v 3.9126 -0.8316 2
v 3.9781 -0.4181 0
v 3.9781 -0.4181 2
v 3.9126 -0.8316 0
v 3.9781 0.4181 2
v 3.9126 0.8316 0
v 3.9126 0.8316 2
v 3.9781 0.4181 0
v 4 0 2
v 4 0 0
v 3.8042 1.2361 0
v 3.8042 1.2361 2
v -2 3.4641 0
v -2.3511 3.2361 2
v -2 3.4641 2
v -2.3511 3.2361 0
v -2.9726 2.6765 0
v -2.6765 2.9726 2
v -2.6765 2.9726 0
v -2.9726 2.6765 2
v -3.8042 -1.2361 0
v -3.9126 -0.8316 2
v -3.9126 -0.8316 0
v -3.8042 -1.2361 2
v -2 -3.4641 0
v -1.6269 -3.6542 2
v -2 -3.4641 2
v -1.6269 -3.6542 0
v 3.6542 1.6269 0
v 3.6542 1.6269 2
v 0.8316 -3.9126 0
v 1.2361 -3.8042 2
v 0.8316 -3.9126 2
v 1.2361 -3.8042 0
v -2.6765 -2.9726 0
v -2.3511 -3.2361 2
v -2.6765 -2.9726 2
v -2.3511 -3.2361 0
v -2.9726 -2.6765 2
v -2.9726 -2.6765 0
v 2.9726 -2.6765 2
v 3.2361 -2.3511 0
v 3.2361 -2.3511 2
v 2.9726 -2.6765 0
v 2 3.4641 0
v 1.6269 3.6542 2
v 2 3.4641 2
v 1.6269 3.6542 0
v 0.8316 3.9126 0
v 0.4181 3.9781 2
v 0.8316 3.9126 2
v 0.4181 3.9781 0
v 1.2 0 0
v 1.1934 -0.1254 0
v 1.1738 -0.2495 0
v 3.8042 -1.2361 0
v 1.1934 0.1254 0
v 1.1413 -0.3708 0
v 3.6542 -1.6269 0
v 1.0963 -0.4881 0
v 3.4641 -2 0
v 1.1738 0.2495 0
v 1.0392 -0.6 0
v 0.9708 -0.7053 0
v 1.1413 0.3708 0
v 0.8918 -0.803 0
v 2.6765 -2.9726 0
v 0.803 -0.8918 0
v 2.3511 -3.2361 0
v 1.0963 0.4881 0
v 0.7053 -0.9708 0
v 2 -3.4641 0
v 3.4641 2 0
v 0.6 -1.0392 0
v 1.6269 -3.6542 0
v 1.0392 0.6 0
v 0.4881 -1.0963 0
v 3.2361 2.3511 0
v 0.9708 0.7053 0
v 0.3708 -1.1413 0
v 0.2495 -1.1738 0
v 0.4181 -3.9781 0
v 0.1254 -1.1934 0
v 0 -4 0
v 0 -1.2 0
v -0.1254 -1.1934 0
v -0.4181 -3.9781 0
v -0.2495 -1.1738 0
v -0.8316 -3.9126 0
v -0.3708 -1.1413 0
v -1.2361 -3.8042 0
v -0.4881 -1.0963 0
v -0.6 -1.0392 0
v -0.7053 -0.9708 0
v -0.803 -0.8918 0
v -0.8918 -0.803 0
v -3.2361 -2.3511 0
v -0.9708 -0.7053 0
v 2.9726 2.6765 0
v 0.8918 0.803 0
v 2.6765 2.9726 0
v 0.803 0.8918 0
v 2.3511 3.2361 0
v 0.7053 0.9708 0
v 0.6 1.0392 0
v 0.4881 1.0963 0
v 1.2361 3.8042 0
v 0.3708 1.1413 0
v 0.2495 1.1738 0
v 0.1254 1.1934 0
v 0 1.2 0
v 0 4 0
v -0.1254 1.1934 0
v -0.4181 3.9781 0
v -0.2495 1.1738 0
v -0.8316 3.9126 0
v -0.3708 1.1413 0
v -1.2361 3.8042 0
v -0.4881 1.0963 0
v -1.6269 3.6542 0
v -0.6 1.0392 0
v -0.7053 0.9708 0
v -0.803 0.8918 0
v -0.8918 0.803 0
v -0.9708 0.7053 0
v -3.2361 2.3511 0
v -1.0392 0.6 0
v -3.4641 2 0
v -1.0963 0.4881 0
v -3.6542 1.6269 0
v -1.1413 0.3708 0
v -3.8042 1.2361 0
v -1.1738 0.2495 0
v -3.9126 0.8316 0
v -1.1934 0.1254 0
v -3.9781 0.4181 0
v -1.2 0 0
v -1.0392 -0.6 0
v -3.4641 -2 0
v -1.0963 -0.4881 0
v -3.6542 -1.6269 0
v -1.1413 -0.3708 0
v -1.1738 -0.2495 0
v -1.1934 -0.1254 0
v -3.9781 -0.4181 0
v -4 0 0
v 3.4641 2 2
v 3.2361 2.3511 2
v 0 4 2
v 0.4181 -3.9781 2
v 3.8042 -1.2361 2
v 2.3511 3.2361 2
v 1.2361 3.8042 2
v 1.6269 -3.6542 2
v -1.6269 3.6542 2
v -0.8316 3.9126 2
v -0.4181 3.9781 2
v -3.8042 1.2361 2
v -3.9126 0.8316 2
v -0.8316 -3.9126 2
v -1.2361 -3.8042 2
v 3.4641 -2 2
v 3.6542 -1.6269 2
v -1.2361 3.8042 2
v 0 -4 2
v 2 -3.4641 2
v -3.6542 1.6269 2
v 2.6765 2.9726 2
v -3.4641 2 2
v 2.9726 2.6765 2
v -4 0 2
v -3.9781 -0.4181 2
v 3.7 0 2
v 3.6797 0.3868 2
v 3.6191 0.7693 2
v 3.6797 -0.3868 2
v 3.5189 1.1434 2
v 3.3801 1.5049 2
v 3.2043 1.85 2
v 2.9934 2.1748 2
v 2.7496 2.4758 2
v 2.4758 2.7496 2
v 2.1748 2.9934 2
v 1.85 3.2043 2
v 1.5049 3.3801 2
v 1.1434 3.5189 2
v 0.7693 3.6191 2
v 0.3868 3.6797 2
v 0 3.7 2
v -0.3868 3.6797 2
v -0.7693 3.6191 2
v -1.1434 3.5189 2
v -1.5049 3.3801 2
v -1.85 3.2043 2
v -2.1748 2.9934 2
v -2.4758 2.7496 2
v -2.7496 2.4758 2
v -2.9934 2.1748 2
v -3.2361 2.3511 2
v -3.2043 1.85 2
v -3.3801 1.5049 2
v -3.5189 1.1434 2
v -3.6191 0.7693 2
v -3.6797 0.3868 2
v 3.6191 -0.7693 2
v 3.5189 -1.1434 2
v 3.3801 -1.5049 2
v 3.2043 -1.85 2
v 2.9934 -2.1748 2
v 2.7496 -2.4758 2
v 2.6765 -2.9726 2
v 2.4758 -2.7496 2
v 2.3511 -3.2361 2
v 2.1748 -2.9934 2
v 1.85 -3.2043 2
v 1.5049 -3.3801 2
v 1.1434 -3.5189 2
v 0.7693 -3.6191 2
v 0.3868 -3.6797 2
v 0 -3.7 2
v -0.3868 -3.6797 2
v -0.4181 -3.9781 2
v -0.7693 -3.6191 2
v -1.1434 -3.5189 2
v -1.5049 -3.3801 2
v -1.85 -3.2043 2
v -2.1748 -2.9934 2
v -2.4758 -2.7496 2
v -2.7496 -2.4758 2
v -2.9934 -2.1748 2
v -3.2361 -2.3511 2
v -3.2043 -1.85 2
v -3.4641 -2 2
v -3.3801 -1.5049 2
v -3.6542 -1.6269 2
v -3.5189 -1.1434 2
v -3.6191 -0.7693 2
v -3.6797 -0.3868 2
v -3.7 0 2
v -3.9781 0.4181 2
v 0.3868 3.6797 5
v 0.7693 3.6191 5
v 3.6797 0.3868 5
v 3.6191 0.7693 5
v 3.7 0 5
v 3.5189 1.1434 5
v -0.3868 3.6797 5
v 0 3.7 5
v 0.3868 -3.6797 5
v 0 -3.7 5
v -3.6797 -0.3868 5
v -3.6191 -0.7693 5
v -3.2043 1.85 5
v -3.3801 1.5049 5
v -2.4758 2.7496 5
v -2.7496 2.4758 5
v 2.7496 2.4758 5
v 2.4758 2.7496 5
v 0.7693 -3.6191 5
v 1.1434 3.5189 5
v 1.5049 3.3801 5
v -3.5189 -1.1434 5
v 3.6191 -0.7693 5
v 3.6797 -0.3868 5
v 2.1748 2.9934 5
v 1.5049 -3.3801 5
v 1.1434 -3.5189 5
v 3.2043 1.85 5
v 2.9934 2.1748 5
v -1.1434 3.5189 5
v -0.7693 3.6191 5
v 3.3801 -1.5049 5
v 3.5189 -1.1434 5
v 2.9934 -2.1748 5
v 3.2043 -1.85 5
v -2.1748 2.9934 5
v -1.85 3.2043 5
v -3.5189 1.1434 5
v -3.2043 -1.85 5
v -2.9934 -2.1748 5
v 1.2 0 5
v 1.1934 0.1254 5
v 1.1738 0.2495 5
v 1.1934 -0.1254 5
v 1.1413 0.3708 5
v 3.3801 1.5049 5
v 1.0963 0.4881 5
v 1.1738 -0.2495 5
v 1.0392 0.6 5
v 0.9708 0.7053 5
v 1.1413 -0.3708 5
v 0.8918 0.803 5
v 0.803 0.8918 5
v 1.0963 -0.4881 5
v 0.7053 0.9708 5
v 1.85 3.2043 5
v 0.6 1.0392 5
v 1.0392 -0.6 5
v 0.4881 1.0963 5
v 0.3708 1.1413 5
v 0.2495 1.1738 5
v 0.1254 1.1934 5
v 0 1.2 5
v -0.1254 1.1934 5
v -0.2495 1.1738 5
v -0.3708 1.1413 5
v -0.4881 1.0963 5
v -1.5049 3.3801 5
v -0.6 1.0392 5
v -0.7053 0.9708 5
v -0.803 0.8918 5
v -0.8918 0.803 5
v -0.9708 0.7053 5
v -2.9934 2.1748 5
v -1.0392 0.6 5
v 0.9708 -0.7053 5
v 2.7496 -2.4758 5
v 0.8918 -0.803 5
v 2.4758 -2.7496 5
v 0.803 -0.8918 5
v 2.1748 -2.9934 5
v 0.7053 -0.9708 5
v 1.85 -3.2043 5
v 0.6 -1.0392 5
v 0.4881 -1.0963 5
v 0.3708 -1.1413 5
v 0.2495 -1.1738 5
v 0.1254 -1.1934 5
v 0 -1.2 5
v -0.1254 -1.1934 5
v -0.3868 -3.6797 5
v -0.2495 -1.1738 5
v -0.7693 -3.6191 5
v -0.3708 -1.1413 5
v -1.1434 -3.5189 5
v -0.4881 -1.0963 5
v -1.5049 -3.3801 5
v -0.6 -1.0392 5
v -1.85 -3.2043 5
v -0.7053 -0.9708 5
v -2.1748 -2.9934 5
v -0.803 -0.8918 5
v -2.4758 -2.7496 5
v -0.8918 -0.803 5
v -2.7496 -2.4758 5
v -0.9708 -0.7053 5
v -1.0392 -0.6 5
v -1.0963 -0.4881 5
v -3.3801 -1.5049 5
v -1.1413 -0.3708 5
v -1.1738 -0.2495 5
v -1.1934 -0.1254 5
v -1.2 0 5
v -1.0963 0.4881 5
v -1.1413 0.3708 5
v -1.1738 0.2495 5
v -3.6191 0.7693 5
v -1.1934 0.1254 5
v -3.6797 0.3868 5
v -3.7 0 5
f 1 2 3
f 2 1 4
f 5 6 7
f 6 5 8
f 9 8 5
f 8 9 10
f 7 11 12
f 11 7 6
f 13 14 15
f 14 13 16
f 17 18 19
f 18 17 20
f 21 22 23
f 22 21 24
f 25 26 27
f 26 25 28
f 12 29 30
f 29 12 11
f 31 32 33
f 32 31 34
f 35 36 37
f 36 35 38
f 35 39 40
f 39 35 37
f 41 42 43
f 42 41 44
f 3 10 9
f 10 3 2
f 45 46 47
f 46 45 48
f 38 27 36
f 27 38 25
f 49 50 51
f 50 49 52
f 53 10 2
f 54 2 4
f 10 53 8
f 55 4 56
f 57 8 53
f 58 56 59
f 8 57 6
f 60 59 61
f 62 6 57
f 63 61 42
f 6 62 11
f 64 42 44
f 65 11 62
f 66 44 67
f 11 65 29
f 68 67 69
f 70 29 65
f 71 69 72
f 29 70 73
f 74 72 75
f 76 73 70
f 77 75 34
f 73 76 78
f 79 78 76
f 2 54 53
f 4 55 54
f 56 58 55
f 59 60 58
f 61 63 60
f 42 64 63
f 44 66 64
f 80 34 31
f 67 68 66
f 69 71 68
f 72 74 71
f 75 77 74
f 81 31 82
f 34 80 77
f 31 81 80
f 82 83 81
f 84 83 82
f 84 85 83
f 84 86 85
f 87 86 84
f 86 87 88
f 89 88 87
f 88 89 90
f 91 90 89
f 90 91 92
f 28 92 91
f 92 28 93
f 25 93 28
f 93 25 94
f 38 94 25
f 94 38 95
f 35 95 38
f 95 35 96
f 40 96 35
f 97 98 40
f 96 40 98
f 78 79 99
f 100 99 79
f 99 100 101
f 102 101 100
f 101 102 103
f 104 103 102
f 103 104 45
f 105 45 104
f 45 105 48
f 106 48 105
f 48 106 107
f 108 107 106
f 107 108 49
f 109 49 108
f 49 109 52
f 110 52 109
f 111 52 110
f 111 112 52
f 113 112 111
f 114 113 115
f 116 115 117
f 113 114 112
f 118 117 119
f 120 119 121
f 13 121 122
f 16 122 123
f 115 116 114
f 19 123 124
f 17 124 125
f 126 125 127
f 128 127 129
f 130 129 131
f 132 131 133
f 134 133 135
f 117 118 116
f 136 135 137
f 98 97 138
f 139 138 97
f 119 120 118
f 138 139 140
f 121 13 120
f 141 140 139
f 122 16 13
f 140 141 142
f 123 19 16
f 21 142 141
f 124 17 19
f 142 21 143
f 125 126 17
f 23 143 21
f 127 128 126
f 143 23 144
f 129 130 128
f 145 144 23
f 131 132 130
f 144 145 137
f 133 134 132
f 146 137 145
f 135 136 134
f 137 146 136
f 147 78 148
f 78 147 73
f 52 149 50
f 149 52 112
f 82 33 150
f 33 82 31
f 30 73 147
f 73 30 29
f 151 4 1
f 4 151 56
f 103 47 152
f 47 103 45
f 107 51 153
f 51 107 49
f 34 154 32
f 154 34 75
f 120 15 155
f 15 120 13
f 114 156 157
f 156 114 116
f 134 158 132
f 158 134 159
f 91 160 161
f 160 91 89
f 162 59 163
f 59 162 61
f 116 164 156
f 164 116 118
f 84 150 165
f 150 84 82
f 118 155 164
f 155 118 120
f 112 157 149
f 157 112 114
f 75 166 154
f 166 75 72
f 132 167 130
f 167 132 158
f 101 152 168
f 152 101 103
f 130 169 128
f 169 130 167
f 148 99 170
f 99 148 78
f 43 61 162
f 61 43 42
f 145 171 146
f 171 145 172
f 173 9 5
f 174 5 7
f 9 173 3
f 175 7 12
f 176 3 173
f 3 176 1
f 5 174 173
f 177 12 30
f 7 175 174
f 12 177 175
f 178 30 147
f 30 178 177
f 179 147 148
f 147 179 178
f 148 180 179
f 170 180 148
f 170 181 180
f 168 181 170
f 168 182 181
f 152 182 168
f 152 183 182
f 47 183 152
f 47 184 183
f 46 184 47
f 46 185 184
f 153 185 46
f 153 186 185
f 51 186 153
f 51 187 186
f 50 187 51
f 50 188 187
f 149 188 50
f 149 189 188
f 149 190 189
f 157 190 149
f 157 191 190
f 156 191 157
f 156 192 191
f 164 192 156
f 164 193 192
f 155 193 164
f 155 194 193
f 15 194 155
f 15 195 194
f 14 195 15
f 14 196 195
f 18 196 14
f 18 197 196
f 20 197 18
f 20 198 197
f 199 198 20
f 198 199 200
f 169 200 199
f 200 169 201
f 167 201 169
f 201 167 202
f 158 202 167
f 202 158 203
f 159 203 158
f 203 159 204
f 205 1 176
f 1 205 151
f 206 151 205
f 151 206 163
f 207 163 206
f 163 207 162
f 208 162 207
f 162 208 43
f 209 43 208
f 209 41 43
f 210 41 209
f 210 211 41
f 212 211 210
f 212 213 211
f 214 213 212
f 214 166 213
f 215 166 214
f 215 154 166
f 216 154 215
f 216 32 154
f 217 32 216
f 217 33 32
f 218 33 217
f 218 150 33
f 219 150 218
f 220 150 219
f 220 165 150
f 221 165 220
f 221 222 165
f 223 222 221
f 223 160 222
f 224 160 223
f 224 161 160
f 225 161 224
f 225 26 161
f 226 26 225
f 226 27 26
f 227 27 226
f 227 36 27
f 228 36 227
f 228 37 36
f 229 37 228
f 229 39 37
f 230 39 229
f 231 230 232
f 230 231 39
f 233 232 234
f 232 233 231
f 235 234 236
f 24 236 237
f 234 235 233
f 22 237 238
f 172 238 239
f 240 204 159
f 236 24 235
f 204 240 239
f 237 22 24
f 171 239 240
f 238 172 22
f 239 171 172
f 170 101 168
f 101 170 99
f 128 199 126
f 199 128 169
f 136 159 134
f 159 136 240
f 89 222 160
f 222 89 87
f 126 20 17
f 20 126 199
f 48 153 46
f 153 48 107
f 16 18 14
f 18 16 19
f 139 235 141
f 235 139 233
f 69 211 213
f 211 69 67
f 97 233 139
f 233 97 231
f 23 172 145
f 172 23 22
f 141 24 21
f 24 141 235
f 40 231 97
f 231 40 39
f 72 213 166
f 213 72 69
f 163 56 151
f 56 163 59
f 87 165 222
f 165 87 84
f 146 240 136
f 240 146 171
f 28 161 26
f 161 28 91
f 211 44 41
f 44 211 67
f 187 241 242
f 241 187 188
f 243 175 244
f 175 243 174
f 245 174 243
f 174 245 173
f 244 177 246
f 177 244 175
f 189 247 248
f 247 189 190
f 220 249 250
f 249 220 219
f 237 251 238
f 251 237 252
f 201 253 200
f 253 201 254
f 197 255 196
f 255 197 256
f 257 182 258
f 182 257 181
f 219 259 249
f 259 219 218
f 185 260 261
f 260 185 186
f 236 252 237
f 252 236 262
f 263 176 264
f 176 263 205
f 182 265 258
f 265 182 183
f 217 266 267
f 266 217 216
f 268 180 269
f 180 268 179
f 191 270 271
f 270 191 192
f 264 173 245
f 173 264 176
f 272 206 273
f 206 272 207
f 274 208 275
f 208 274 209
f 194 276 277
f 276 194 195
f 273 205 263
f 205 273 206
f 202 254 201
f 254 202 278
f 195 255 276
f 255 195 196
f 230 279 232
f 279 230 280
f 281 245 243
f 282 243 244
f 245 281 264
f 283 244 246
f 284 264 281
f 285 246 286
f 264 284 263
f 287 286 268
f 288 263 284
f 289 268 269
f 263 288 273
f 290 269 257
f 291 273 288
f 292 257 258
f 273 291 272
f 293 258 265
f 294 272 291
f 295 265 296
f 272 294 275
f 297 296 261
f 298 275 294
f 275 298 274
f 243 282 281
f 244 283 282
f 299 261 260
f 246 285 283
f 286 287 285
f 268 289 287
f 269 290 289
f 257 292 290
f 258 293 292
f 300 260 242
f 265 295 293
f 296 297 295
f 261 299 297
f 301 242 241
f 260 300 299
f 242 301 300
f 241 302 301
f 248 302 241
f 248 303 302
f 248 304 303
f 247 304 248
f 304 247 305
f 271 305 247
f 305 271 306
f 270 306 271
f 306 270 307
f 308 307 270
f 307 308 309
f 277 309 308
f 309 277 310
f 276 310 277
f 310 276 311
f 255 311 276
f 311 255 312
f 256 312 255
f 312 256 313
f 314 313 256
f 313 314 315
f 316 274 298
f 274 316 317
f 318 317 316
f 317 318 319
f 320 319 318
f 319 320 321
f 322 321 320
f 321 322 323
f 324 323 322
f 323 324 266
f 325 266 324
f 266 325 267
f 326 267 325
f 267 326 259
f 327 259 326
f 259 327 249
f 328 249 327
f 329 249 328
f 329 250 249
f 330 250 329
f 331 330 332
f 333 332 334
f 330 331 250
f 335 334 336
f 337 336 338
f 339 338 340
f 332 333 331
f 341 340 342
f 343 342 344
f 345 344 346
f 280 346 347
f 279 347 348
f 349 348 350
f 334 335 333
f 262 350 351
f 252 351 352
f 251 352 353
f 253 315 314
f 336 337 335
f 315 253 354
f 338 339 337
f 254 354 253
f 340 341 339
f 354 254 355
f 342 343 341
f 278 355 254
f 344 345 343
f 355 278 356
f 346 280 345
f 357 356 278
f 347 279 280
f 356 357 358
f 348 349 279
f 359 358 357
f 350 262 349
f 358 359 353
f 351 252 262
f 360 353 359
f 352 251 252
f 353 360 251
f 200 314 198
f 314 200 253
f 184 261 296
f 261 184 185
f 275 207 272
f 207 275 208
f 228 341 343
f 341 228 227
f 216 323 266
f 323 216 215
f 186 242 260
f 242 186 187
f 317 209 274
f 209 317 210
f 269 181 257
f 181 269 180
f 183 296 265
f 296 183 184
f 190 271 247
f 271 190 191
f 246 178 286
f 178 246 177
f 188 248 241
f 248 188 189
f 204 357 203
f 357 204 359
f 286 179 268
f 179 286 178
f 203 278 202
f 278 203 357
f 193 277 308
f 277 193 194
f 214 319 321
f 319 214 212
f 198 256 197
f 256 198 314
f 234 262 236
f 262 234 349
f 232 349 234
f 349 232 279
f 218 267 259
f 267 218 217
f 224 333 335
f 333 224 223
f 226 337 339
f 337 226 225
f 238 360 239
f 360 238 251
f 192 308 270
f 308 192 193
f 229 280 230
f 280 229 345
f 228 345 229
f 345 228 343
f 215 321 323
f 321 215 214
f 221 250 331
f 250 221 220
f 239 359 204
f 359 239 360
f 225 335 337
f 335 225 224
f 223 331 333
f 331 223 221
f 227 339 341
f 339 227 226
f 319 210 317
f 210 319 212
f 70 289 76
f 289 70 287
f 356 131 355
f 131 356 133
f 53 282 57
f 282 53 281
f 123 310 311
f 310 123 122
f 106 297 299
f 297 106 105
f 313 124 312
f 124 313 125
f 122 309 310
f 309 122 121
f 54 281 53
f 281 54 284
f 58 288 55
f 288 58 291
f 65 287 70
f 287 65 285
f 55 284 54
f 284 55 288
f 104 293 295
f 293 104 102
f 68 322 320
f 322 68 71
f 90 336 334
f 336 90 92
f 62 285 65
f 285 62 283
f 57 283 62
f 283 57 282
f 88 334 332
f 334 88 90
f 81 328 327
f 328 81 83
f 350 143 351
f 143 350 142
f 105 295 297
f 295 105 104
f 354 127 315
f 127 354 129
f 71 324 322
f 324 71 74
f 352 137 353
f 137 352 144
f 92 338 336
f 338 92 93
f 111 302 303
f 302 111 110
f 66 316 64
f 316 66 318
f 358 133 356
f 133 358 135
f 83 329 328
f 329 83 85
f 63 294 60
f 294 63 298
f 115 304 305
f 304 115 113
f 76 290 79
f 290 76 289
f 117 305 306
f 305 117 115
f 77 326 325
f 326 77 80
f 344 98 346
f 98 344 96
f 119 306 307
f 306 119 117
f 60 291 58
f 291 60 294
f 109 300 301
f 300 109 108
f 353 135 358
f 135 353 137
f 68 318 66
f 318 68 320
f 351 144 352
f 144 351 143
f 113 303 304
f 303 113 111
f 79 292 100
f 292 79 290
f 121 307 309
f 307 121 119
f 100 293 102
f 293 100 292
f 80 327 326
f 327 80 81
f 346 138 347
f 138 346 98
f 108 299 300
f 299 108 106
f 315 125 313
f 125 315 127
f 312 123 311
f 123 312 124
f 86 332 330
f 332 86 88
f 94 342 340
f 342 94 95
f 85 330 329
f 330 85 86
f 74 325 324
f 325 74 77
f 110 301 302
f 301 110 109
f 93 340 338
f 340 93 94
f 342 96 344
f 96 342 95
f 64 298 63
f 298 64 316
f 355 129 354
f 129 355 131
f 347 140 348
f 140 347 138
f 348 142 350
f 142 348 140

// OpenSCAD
// PCB standoff with mounting base.
$fn = 60;
eps = 0.02;
thread_d = 2.4;
base_d = 8;
height = 5;
body_d = thread_d+5;
difference() {
    union() { cylinder(d=base_d,h=2); cylinder(d=body_d,h=height); }
    translate([0,0,-eps]) cylinder(d=thread_d,h=height+2*eps);
}
